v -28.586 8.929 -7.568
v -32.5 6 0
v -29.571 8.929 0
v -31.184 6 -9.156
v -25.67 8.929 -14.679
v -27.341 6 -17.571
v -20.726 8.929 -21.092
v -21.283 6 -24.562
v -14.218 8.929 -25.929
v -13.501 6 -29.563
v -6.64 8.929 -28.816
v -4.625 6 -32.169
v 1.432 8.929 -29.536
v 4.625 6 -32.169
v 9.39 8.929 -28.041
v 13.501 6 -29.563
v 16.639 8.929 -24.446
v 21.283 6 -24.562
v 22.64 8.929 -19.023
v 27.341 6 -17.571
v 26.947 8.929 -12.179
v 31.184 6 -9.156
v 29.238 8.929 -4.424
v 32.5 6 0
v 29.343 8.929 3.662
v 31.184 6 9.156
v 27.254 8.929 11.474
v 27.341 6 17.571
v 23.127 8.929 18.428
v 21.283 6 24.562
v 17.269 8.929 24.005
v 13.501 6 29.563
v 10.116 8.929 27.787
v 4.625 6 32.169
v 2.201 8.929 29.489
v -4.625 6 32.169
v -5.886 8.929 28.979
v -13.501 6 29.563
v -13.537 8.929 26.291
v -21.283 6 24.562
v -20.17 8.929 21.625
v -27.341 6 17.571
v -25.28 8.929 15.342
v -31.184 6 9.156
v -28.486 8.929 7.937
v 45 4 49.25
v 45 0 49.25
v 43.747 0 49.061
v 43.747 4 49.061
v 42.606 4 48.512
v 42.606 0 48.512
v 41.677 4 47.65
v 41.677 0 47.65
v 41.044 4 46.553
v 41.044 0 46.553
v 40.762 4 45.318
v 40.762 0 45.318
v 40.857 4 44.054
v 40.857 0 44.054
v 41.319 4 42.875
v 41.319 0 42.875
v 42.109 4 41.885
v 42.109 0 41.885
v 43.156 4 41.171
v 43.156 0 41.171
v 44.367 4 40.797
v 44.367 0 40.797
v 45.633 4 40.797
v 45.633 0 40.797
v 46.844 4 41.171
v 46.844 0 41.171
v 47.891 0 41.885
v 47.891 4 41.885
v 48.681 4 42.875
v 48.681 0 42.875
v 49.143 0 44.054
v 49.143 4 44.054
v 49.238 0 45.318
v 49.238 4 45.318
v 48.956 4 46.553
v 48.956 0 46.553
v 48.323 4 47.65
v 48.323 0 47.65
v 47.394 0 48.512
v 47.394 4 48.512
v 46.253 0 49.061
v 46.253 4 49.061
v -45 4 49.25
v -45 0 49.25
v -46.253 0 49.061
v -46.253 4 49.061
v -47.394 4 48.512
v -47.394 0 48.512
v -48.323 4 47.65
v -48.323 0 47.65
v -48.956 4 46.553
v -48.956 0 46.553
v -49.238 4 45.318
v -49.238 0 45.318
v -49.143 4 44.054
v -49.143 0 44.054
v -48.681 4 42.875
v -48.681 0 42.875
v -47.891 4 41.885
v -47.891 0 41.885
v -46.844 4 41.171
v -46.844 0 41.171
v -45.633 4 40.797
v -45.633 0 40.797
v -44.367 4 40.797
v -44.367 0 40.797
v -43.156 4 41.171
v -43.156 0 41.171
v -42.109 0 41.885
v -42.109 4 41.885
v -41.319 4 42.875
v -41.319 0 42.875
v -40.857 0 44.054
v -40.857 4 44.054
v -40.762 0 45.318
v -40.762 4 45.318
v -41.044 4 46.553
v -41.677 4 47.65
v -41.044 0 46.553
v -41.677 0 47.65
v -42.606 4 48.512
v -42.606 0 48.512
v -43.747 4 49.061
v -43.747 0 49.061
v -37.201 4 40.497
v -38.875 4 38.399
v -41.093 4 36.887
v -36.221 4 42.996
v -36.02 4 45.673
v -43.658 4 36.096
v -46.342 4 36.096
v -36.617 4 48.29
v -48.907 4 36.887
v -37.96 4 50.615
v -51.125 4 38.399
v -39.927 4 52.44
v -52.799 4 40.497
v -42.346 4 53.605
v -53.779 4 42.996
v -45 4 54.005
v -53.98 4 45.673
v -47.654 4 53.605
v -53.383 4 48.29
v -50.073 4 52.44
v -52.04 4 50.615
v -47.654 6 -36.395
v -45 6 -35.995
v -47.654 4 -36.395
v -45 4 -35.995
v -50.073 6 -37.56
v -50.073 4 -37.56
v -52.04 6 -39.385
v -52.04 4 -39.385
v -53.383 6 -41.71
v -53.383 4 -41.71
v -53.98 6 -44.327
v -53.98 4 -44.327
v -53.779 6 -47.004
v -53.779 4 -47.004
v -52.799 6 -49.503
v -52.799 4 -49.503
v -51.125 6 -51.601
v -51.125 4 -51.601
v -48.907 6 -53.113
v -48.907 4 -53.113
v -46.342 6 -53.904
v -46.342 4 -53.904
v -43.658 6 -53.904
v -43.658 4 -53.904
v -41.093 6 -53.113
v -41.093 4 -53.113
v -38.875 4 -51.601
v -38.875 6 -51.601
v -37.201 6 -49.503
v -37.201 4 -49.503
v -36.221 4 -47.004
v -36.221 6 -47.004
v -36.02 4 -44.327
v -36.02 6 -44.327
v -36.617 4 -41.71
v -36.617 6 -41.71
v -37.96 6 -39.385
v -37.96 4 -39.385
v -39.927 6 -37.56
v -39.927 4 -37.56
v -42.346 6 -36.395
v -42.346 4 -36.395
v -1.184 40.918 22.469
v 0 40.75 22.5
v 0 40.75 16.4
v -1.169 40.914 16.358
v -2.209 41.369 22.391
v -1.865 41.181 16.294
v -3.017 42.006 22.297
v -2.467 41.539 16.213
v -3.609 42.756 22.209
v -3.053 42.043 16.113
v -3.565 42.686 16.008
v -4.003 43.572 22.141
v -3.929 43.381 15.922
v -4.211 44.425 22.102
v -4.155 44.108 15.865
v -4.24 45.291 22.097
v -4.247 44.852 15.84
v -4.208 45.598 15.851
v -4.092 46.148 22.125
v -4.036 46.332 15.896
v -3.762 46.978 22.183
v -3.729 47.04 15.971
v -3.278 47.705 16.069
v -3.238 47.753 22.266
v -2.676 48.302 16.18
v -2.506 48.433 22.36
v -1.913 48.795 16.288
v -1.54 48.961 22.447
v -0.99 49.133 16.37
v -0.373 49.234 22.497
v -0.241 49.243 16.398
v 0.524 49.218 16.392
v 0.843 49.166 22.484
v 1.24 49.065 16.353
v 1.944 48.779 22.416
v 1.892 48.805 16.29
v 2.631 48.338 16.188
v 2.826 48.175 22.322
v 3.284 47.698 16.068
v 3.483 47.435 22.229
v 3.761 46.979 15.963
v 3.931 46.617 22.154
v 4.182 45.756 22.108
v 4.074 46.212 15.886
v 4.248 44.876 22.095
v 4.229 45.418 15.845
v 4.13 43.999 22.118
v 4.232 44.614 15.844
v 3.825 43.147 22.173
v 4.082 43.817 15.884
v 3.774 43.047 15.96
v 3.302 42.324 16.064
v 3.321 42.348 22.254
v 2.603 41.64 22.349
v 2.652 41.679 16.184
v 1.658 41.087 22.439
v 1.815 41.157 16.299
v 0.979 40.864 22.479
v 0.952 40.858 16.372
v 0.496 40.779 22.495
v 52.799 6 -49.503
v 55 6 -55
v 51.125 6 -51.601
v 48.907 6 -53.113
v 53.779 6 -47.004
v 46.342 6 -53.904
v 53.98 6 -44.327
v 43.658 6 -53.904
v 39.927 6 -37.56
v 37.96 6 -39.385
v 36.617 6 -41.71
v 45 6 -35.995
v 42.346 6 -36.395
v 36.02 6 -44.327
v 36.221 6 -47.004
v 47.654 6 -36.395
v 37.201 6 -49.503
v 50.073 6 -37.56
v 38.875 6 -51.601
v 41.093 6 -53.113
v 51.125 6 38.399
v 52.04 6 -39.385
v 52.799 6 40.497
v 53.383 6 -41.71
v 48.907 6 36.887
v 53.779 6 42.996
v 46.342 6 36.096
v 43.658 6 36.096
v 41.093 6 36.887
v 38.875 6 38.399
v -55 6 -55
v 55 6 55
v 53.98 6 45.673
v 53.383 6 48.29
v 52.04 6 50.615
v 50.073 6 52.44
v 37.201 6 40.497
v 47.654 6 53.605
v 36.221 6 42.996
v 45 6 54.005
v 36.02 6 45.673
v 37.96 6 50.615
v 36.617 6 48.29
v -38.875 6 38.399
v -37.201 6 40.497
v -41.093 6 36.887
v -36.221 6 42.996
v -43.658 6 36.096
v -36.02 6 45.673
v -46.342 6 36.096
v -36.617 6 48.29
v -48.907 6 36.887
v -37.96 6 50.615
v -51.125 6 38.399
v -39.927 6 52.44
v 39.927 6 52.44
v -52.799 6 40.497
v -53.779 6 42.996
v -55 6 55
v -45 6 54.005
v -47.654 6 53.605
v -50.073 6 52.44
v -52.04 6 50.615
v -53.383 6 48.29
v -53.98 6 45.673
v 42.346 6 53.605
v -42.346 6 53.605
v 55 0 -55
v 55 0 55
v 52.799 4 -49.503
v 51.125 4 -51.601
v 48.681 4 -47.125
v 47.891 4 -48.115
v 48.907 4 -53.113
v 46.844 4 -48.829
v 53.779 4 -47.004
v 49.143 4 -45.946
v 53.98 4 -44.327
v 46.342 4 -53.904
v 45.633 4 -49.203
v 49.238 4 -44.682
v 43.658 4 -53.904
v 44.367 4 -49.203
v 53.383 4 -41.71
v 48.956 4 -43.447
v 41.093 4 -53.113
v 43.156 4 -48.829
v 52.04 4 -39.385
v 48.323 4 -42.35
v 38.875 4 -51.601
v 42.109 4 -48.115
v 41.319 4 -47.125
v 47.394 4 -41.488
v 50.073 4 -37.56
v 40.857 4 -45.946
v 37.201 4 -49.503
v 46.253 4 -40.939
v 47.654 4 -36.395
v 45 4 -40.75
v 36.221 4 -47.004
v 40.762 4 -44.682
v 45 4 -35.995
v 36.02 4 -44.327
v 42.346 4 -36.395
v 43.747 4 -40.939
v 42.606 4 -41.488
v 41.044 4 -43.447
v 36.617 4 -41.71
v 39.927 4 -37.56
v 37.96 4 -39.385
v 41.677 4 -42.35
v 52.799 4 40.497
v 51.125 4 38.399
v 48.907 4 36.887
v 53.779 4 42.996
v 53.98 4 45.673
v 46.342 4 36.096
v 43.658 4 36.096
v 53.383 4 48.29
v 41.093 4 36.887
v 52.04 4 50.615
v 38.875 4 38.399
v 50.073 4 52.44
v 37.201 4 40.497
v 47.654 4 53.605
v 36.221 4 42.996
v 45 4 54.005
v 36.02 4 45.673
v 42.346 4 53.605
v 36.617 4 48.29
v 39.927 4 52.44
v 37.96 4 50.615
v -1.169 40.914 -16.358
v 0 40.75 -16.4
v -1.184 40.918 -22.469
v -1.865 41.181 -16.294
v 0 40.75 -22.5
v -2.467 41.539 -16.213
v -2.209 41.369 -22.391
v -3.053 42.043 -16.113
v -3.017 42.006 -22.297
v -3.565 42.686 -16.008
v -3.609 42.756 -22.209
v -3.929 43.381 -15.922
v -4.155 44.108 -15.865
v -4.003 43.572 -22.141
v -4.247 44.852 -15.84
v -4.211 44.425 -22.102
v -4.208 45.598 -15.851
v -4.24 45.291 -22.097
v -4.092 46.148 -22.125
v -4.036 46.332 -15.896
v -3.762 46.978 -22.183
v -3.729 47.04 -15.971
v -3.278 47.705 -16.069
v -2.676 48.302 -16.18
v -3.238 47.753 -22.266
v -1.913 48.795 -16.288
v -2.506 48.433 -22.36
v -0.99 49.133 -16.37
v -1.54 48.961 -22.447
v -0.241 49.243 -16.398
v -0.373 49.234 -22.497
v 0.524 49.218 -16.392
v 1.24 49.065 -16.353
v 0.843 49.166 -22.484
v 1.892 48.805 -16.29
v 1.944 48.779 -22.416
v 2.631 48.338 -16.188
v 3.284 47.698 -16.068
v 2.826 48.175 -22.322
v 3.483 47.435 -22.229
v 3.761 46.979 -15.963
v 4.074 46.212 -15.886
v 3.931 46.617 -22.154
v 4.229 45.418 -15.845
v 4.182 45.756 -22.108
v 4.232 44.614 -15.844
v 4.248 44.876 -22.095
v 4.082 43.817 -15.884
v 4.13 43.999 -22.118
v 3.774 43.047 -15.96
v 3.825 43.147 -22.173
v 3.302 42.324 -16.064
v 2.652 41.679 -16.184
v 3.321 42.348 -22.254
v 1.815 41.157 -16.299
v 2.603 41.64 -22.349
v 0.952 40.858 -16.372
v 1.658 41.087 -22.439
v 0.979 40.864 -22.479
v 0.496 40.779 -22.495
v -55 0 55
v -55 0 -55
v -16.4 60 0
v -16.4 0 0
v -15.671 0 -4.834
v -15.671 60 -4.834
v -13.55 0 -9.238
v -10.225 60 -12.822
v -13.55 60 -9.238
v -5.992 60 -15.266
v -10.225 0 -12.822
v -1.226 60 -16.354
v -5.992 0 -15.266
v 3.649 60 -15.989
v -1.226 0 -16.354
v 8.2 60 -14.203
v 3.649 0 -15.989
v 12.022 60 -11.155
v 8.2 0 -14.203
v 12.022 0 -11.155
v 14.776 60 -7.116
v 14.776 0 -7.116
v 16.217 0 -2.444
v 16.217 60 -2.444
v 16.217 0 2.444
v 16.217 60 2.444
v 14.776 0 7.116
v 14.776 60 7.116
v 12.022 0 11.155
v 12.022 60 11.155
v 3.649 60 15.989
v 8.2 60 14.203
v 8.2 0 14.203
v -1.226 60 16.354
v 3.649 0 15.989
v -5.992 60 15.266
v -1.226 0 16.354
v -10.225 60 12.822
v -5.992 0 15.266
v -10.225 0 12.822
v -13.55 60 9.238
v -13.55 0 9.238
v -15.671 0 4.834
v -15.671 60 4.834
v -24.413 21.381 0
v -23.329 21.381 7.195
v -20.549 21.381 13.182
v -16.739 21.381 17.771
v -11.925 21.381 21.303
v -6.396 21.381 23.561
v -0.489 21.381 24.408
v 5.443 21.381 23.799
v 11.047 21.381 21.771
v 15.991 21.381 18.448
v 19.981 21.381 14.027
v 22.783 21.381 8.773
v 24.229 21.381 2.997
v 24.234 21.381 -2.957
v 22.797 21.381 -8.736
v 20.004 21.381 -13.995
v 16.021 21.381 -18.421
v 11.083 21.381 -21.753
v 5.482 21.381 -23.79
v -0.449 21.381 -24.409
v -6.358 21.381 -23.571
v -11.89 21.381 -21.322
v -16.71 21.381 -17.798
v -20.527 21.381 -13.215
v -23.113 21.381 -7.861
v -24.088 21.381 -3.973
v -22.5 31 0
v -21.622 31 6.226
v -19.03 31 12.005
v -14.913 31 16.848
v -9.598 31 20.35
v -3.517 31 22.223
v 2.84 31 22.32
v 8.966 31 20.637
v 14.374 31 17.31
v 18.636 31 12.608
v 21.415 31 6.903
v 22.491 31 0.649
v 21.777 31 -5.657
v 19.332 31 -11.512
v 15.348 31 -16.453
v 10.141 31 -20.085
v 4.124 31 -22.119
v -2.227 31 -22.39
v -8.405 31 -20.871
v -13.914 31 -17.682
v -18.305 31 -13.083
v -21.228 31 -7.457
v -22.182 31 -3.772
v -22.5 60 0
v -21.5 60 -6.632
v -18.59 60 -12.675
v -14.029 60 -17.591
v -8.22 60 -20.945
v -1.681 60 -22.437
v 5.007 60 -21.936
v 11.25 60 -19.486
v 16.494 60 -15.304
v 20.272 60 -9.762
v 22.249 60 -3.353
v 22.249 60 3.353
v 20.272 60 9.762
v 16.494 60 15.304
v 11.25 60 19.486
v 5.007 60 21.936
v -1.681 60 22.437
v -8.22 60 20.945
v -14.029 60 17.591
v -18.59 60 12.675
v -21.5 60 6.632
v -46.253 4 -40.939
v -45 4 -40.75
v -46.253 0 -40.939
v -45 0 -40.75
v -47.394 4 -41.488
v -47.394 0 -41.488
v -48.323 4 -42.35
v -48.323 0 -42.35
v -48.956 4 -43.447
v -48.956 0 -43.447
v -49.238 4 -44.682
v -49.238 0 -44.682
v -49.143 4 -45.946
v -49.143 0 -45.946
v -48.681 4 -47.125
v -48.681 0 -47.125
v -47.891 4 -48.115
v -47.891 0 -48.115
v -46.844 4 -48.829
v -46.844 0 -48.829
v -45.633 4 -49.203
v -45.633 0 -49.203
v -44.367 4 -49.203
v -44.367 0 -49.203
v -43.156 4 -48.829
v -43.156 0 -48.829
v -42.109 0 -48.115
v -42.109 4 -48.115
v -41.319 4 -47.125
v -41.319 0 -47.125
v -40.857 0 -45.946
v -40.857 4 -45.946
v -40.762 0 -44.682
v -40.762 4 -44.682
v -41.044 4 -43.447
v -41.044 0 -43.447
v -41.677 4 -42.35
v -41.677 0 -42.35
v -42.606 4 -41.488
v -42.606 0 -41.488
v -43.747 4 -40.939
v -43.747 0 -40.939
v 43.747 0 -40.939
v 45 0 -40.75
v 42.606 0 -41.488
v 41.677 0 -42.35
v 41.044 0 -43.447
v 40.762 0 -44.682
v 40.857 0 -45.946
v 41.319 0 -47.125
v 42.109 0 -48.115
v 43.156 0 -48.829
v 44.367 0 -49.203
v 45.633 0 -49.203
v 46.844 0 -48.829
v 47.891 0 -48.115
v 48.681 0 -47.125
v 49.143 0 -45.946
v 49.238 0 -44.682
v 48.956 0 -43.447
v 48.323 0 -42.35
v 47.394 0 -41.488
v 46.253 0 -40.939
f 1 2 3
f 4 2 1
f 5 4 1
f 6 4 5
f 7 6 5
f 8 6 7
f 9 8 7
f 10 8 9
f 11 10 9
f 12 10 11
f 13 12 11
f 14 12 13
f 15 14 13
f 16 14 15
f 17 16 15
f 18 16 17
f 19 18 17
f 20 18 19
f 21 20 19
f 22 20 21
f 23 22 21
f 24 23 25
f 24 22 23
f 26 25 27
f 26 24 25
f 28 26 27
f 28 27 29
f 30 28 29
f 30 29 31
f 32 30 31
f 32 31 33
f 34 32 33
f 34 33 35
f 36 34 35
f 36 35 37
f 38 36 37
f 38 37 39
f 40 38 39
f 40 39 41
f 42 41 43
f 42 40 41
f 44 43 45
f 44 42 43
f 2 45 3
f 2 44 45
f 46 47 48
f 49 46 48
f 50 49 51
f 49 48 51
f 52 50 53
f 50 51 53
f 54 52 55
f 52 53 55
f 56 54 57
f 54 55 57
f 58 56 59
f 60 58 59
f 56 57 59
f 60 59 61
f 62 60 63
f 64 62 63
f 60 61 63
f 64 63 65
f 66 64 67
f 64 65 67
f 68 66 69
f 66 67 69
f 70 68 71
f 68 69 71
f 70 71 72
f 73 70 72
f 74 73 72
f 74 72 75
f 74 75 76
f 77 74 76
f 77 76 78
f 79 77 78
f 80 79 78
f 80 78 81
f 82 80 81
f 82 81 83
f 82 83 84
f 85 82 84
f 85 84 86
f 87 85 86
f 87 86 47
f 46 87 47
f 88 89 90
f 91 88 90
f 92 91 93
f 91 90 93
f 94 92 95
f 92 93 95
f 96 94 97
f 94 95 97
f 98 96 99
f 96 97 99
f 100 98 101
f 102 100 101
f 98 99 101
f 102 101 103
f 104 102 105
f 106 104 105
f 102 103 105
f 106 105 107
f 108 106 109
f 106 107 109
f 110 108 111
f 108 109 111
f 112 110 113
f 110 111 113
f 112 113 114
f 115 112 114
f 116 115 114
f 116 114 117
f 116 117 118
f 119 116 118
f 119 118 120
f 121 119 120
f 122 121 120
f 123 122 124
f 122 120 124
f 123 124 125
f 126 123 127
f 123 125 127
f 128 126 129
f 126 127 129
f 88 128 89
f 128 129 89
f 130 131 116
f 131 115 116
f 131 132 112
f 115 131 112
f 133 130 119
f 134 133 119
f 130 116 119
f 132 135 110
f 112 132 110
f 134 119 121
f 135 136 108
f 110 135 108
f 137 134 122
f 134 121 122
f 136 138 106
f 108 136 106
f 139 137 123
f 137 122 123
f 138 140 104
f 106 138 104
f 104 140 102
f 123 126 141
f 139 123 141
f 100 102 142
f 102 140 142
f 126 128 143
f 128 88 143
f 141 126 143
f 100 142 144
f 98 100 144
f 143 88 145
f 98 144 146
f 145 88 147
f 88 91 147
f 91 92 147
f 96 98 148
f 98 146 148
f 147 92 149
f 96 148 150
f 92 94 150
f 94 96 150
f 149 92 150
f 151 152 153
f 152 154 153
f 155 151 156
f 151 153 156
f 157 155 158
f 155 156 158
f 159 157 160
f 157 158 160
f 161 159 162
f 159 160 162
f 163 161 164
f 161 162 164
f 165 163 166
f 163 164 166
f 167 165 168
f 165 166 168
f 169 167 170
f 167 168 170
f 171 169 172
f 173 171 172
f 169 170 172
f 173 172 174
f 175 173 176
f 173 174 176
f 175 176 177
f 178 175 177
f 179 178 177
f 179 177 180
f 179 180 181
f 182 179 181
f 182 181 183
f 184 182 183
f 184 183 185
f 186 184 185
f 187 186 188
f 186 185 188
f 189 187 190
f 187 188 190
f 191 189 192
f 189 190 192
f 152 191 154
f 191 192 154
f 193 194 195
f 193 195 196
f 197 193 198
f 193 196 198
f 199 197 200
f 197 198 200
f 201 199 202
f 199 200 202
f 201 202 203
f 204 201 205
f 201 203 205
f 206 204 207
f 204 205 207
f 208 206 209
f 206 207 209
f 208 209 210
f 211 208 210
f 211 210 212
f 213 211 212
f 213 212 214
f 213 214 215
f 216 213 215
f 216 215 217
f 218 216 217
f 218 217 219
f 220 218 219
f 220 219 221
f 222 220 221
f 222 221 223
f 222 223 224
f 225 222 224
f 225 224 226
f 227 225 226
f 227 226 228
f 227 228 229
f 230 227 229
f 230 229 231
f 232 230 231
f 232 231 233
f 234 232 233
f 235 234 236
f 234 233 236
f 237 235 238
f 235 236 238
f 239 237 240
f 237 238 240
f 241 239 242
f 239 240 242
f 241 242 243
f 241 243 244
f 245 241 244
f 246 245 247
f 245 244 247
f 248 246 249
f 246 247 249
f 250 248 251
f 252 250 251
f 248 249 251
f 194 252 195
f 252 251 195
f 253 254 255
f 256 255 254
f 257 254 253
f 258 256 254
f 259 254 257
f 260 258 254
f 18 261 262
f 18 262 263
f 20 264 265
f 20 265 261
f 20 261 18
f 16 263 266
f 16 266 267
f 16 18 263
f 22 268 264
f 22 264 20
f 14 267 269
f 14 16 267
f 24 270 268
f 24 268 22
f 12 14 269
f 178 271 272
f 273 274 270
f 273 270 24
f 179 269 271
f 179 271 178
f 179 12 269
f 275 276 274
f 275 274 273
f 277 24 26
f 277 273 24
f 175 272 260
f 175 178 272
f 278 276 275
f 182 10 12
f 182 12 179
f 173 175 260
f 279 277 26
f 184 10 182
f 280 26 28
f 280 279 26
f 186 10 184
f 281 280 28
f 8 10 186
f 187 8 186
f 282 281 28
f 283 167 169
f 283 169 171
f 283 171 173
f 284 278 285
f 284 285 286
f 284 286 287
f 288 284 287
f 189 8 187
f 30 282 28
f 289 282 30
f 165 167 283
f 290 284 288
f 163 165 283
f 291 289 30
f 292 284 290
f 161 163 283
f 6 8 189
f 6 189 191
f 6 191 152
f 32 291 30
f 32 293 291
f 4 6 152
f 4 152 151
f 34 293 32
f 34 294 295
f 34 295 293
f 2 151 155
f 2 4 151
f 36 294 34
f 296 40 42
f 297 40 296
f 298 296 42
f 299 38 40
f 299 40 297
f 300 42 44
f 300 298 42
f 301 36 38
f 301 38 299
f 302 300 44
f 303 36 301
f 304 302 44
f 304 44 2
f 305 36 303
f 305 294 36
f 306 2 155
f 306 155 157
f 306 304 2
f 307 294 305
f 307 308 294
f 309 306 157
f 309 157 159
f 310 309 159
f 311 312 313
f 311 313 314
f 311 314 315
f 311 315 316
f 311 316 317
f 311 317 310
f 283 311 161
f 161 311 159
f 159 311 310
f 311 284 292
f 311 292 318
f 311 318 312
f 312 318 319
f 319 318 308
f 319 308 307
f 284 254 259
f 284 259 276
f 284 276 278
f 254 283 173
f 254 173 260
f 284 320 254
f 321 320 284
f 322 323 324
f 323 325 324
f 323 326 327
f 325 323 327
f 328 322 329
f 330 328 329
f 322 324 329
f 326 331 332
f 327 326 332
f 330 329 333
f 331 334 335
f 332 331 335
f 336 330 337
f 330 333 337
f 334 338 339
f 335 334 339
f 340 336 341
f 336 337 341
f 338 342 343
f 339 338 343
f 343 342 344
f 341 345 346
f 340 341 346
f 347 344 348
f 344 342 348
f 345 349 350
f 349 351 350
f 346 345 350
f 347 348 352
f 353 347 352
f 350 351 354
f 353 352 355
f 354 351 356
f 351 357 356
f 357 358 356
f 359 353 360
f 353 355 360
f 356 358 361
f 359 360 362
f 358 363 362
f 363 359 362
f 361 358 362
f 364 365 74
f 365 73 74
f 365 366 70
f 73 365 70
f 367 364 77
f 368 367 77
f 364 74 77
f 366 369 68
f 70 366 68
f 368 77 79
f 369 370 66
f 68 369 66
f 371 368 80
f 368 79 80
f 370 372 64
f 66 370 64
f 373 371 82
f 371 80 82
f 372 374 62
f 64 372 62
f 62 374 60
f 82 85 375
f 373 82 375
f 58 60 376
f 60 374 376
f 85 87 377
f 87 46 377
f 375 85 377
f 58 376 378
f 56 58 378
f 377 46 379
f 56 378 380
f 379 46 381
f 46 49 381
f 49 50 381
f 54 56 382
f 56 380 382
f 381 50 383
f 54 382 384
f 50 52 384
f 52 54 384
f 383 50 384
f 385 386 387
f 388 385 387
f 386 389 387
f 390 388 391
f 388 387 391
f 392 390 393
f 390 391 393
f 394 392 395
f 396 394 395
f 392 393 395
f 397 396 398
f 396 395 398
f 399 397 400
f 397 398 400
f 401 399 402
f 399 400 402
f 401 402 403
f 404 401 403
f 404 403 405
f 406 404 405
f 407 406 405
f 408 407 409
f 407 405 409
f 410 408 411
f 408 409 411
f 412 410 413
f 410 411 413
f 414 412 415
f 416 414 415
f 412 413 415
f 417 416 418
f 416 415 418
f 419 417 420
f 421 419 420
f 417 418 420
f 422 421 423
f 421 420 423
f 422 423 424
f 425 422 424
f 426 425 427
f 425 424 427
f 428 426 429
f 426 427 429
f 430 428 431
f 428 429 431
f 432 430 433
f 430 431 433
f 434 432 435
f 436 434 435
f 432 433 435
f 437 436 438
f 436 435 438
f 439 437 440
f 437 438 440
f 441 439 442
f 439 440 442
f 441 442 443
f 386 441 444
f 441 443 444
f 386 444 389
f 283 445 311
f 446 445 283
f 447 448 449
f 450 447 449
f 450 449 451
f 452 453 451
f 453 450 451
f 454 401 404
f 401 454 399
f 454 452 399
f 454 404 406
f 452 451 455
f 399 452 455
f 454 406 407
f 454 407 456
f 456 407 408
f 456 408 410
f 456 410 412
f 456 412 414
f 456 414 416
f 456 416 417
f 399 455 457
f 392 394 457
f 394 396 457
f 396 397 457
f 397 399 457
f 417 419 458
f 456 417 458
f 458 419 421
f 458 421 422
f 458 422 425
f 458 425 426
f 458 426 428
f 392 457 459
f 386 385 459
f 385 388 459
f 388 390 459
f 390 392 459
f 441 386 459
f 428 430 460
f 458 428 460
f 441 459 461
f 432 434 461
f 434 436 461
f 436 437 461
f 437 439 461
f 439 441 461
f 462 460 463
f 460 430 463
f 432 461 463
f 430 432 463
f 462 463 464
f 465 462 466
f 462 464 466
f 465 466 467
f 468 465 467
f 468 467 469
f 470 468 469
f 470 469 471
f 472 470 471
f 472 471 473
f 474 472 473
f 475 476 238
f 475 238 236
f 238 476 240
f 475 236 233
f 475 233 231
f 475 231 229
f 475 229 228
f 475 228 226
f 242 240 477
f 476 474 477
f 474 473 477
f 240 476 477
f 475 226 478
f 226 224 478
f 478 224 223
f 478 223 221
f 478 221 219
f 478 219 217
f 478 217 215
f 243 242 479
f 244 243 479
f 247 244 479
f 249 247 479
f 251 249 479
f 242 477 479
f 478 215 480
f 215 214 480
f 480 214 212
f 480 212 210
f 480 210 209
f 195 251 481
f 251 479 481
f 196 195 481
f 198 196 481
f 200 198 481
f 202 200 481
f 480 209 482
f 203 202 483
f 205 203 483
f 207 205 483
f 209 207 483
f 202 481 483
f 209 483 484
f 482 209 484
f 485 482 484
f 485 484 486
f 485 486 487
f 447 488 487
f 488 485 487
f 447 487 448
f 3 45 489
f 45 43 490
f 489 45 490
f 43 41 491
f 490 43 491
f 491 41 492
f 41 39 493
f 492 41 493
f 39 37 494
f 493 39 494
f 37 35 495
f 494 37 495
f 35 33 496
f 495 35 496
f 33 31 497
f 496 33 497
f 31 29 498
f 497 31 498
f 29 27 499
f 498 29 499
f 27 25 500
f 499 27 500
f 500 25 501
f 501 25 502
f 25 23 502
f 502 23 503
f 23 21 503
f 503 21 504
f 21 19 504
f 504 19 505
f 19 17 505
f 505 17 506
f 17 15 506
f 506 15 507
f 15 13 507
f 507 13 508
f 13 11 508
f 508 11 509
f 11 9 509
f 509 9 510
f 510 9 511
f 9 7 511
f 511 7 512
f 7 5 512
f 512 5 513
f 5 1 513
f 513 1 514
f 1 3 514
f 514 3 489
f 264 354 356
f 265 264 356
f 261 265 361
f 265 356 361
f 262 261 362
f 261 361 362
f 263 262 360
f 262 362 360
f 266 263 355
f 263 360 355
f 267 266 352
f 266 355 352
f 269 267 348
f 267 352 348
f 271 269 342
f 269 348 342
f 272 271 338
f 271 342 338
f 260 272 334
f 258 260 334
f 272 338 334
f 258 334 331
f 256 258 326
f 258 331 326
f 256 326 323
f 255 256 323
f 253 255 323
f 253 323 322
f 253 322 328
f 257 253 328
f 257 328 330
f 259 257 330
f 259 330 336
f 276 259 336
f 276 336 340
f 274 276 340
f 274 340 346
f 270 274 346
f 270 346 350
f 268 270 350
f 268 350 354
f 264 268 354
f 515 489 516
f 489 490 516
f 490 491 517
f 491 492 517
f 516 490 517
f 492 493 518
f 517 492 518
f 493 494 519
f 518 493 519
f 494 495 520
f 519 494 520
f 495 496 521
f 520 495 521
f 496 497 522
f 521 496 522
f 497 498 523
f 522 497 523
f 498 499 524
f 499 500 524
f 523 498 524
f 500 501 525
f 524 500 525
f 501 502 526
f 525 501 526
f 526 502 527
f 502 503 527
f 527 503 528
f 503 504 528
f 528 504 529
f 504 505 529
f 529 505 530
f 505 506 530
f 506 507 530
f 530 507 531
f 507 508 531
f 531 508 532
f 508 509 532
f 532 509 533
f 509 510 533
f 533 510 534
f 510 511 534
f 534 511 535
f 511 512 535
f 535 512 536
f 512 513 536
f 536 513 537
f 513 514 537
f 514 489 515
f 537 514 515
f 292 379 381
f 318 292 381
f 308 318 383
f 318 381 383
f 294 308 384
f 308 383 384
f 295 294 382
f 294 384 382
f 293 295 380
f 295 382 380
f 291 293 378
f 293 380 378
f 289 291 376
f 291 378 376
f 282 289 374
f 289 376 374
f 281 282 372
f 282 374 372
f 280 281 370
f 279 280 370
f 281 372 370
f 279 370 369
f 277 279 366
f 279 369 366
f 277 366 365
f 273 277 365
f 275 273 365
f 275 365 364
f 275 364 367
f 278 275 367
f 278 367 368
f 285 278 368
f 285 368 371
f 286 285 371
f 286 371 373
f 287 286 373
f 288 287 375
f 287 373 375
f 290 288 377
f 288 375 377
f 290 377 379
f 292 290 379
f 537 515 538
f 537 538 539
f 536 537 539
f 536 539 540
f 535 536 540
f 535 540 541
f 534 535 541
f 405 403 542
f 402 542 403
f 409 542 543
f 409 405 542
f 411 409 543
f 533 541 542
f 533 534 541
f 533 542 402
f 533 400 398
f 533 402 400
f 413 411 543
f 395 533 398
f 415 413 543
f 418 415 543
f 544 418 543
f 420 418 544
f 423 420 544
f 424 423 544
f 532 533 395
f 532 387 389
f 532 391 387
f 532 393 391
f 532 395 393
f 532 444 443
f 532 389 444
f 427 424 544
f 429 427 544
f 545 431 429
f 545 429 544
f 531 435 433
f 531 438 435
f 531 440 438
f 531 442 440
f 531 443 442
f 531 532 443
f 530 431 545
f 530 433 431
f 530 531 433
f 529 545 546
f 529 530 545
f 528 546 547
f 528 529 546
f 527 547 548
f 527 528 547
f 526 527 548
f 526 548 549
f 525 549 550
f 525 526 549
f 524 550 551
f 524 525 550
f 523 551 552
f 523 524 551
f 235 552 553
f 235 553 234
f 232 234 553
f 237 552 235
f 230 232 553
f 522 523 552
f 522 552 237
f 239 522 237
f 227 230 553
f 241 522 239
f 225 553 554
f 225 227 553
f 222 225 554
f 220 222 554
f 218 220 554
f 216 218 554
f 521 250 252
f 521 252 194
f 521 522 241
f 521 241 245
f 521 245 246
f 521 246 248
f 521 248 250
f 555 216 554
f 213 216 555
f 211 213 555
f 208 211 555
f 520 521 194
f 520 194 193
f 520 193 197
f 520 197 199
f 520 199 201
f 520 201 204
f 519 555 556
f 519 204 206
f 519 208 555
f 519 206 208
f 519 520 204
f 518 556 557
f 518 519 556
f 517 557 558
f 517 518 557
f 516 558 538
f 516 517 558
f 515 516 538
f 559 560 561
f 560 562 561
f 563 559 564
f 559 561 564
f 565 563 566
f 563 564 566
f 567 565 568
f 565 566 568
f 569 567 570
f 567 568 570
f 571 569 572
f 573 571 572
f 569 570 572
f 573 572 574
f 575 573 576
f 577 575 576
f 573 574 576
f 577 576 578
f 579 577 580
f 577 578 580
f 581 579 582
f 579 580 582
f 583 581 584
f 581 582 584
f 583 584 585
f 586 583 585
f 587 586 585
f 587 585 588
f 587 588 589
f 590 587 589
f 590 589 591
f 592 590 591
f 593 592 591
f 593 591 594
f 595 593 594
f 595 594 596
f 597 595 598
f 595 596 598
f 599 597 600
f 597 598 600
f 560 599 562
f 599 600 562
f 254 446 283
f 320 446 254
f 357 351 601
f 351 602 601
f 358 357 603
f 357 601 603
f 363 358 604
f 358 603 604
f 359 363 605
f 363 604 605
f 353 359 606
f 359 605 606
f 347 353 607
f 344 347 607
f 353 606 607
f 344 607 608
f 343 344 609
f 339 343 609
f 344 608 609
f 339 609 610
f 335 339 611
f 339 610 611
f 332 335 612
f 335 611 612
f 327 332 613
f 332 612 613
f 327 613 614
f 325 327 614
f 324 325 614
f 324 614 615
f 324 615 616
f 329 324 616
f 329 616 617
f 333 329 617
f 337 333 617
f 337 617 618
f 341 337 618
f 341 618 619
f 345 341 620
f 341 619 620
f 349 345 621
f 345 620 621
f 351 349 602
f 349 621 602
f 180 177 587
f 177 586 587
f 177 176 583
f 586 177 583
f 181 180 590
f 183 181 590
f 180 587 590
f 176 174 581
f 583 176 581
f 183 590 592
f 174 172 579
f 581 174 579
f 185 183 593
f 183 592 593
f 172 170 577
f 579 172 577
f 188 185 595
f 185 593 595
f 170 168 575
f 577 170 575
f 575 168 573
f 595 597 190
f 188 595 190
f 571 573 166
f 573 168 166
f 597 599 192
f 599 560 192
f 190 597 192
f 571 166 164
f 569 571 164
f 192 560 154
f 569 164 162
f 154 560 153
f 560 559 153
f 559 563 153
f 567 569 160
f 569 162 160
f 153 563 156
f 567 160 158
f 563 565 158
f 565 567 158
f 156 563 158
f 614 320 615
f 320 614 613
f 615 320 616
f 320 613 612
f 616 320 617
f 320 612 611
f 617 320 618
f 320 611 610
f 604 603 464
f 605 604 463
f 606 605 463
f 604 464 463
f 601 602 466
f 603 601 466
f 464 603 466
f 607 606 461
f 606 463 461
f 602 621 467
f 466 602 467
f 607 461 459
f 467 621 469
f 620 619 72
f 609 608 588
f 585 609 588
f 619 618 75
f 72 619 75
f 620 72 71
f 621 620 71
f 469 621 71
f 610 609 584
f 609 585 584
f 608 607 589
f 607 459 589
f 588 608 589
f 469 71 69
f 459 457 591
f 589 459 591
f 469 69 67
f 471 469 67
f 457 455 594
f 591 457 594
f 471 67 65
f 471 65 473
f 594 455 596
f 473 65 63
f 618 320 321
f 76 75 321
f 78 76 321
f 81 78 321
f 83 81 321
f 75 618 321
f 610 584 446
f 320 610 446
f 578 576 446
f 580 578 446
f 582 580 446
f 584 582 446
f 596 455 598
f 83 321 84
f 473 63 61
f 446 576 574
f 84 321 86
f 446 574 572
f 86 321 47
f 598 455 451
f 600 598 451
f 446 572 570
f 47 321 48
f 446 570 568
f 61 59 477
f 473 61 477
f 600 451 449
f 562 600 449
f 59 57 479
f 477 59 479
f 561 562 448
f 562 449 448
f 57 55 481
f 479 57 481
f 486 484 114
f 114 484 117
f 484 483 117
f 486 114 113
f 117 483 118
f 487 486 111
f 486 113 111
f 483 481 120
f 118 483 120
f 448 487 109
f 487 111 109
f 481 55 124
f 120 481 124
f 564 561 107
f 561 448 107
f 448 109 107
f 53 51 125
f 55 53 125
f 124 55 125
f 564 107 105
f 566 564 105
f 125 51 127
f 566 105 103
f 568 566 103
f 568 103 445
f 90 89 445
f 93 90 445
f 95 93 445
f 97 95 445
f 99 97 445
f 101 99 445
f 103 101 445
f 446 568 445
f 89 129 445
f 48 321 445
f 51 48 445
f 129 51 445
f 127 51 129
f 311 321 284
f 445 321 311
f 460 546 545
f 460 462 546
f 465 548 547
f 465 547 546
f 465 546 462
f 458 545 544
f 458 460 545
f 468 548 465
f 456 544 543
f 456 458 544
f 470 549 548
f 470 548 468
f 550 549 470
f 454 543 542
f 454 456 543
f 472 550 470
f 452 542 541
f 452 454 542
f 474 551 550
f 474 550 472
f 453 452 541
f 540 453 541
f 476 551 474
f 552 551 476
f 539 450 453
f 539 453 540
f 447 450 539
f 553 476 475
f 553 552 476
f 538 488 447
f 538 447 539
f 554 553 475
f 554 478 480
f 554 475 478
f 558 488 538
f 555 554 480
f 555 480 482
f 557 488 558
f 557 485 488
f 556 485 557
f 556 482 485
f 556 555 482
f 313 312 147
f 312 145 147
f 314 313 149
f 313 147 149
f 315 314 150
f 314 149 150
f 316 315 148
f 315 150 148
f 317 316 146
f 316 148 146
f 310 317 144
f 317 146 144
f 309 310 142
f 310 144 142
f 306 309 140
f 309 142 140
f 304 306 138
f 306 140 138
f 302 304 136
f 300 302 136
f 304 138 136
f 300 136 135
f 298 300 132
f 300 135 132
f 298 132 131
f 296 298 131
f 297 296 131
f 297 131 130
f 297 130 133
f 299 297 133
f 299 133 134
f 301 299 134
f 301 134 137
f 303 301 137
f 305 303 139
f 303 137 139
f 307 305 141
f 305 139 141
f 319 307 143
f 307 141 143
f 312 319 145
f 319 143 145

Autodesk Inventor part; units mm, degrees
ref_plane "YZ Plane" through (0, 0, 0) normal (1, 0, 0) x (0, 1, 0)
ref_plane "XZ Plane" through (0, 0, 0) normal (0, 1, 0) x (-1, 0, 0)
ref_plane "XY Plane" through (0, 0, 0) normal (0, 0, 1) x (1, 0, 0)
sketch "Sketch1" plane through (0, 0, 0) normal (0, 1, 0) x (-1, 0, 0)
  circle A0 centre (0, 0) radius 22.5
  line L0 (55, -55) -> (-55, -55)
  line L1 (-55, -55) -> (-55, 55)
  line L2 (-55, 55) -> (55, 55)
  line L3 (55, 55) -> (55, -55)
  line L4 (55, -55) -> (-55, 55) construction
  line L5 (-55, -55) -> (55, 55) construction
  circle A1 centre (0, 0) radius 16.4
  dimension "d0" = 45
  dimension "d1" = 110
  dimension "d2" = 110
  dimension "d3" = 32.8
extrude "Extrusion1" add sketch "Sketch1" along normal blind 6 contours L0 L1 L2 L3
extrude "Extrusion2" add sketch "Sketch1" along normal blind 60 contours A0
chamfer "Chamfer1" distance 10 angle 45 1 edges at (22.5, 6, 0)
sketch "Sketch3" plane through (0, 6, 0) normal (0, 1, 0) x (1, 0, 0)
  line L0 (55, -55) -> (55, 55) projected
  line L1 (55, 55) -> (-55, 55) projected
  line L2 (-55, -55) -> (55, -55) projected
  line L3 (-55, 55) -> (-55, -55) projected
  point P0 (0, 0)
  point P1 (-45, 45)
  point P2 (-45, -45)
  point P3 (45, -45)
  point P4 (45, 45)
  point P5 (55, 0)
  point P6 (0, 55)
  point P7 (0, -55)
  point P8 (-55, 0)
  dimension "d14" = 10
  dimension "d15" = 10
  dimension "d16" = 10
  dimension "d17" = 10
hole "Hole1" at (-45, 6, -45) at (45, 6, -45) at (45, 6, 45) at (-45, 6, 45) direction (0, -1, 0) diameter 8.5 end through all counterbore diameter 18.01 counterbore depth 2 clearance for "Hex Head Bolt" size "M8" standard "Ansi Metric M Profile"
sketch "Sketch4" plane through (-55, 0, 55) normal (0, 0, 1) x (1, 0, 0)
  line L0 (0, 0) -> (110, 0) projected
  line L1 (77.5, 60) -> (32.5, 60) projected
  point P0 (55, 0)
  point P1 (55, 45)
  point P2 (55, 0)
  dimension "d25" = 15
hole "Hole2" at (0, 45, 55) direction (0, 0, -1) diameter 8.5 end through all clearance for "Hex Head Bolt" size "M8" standard "Ansi Metric M Profile"
chamfer "Chamfer2" distance 10 angle 45 1 edges at (22.5, 16, 0)
chamfer "Chamfer3" distance 5 angle 45 1 edges at (22.5, 26, 0)
properties part number "Soporte_Vertical_Para_Balancin" material "ABS Plastic"
